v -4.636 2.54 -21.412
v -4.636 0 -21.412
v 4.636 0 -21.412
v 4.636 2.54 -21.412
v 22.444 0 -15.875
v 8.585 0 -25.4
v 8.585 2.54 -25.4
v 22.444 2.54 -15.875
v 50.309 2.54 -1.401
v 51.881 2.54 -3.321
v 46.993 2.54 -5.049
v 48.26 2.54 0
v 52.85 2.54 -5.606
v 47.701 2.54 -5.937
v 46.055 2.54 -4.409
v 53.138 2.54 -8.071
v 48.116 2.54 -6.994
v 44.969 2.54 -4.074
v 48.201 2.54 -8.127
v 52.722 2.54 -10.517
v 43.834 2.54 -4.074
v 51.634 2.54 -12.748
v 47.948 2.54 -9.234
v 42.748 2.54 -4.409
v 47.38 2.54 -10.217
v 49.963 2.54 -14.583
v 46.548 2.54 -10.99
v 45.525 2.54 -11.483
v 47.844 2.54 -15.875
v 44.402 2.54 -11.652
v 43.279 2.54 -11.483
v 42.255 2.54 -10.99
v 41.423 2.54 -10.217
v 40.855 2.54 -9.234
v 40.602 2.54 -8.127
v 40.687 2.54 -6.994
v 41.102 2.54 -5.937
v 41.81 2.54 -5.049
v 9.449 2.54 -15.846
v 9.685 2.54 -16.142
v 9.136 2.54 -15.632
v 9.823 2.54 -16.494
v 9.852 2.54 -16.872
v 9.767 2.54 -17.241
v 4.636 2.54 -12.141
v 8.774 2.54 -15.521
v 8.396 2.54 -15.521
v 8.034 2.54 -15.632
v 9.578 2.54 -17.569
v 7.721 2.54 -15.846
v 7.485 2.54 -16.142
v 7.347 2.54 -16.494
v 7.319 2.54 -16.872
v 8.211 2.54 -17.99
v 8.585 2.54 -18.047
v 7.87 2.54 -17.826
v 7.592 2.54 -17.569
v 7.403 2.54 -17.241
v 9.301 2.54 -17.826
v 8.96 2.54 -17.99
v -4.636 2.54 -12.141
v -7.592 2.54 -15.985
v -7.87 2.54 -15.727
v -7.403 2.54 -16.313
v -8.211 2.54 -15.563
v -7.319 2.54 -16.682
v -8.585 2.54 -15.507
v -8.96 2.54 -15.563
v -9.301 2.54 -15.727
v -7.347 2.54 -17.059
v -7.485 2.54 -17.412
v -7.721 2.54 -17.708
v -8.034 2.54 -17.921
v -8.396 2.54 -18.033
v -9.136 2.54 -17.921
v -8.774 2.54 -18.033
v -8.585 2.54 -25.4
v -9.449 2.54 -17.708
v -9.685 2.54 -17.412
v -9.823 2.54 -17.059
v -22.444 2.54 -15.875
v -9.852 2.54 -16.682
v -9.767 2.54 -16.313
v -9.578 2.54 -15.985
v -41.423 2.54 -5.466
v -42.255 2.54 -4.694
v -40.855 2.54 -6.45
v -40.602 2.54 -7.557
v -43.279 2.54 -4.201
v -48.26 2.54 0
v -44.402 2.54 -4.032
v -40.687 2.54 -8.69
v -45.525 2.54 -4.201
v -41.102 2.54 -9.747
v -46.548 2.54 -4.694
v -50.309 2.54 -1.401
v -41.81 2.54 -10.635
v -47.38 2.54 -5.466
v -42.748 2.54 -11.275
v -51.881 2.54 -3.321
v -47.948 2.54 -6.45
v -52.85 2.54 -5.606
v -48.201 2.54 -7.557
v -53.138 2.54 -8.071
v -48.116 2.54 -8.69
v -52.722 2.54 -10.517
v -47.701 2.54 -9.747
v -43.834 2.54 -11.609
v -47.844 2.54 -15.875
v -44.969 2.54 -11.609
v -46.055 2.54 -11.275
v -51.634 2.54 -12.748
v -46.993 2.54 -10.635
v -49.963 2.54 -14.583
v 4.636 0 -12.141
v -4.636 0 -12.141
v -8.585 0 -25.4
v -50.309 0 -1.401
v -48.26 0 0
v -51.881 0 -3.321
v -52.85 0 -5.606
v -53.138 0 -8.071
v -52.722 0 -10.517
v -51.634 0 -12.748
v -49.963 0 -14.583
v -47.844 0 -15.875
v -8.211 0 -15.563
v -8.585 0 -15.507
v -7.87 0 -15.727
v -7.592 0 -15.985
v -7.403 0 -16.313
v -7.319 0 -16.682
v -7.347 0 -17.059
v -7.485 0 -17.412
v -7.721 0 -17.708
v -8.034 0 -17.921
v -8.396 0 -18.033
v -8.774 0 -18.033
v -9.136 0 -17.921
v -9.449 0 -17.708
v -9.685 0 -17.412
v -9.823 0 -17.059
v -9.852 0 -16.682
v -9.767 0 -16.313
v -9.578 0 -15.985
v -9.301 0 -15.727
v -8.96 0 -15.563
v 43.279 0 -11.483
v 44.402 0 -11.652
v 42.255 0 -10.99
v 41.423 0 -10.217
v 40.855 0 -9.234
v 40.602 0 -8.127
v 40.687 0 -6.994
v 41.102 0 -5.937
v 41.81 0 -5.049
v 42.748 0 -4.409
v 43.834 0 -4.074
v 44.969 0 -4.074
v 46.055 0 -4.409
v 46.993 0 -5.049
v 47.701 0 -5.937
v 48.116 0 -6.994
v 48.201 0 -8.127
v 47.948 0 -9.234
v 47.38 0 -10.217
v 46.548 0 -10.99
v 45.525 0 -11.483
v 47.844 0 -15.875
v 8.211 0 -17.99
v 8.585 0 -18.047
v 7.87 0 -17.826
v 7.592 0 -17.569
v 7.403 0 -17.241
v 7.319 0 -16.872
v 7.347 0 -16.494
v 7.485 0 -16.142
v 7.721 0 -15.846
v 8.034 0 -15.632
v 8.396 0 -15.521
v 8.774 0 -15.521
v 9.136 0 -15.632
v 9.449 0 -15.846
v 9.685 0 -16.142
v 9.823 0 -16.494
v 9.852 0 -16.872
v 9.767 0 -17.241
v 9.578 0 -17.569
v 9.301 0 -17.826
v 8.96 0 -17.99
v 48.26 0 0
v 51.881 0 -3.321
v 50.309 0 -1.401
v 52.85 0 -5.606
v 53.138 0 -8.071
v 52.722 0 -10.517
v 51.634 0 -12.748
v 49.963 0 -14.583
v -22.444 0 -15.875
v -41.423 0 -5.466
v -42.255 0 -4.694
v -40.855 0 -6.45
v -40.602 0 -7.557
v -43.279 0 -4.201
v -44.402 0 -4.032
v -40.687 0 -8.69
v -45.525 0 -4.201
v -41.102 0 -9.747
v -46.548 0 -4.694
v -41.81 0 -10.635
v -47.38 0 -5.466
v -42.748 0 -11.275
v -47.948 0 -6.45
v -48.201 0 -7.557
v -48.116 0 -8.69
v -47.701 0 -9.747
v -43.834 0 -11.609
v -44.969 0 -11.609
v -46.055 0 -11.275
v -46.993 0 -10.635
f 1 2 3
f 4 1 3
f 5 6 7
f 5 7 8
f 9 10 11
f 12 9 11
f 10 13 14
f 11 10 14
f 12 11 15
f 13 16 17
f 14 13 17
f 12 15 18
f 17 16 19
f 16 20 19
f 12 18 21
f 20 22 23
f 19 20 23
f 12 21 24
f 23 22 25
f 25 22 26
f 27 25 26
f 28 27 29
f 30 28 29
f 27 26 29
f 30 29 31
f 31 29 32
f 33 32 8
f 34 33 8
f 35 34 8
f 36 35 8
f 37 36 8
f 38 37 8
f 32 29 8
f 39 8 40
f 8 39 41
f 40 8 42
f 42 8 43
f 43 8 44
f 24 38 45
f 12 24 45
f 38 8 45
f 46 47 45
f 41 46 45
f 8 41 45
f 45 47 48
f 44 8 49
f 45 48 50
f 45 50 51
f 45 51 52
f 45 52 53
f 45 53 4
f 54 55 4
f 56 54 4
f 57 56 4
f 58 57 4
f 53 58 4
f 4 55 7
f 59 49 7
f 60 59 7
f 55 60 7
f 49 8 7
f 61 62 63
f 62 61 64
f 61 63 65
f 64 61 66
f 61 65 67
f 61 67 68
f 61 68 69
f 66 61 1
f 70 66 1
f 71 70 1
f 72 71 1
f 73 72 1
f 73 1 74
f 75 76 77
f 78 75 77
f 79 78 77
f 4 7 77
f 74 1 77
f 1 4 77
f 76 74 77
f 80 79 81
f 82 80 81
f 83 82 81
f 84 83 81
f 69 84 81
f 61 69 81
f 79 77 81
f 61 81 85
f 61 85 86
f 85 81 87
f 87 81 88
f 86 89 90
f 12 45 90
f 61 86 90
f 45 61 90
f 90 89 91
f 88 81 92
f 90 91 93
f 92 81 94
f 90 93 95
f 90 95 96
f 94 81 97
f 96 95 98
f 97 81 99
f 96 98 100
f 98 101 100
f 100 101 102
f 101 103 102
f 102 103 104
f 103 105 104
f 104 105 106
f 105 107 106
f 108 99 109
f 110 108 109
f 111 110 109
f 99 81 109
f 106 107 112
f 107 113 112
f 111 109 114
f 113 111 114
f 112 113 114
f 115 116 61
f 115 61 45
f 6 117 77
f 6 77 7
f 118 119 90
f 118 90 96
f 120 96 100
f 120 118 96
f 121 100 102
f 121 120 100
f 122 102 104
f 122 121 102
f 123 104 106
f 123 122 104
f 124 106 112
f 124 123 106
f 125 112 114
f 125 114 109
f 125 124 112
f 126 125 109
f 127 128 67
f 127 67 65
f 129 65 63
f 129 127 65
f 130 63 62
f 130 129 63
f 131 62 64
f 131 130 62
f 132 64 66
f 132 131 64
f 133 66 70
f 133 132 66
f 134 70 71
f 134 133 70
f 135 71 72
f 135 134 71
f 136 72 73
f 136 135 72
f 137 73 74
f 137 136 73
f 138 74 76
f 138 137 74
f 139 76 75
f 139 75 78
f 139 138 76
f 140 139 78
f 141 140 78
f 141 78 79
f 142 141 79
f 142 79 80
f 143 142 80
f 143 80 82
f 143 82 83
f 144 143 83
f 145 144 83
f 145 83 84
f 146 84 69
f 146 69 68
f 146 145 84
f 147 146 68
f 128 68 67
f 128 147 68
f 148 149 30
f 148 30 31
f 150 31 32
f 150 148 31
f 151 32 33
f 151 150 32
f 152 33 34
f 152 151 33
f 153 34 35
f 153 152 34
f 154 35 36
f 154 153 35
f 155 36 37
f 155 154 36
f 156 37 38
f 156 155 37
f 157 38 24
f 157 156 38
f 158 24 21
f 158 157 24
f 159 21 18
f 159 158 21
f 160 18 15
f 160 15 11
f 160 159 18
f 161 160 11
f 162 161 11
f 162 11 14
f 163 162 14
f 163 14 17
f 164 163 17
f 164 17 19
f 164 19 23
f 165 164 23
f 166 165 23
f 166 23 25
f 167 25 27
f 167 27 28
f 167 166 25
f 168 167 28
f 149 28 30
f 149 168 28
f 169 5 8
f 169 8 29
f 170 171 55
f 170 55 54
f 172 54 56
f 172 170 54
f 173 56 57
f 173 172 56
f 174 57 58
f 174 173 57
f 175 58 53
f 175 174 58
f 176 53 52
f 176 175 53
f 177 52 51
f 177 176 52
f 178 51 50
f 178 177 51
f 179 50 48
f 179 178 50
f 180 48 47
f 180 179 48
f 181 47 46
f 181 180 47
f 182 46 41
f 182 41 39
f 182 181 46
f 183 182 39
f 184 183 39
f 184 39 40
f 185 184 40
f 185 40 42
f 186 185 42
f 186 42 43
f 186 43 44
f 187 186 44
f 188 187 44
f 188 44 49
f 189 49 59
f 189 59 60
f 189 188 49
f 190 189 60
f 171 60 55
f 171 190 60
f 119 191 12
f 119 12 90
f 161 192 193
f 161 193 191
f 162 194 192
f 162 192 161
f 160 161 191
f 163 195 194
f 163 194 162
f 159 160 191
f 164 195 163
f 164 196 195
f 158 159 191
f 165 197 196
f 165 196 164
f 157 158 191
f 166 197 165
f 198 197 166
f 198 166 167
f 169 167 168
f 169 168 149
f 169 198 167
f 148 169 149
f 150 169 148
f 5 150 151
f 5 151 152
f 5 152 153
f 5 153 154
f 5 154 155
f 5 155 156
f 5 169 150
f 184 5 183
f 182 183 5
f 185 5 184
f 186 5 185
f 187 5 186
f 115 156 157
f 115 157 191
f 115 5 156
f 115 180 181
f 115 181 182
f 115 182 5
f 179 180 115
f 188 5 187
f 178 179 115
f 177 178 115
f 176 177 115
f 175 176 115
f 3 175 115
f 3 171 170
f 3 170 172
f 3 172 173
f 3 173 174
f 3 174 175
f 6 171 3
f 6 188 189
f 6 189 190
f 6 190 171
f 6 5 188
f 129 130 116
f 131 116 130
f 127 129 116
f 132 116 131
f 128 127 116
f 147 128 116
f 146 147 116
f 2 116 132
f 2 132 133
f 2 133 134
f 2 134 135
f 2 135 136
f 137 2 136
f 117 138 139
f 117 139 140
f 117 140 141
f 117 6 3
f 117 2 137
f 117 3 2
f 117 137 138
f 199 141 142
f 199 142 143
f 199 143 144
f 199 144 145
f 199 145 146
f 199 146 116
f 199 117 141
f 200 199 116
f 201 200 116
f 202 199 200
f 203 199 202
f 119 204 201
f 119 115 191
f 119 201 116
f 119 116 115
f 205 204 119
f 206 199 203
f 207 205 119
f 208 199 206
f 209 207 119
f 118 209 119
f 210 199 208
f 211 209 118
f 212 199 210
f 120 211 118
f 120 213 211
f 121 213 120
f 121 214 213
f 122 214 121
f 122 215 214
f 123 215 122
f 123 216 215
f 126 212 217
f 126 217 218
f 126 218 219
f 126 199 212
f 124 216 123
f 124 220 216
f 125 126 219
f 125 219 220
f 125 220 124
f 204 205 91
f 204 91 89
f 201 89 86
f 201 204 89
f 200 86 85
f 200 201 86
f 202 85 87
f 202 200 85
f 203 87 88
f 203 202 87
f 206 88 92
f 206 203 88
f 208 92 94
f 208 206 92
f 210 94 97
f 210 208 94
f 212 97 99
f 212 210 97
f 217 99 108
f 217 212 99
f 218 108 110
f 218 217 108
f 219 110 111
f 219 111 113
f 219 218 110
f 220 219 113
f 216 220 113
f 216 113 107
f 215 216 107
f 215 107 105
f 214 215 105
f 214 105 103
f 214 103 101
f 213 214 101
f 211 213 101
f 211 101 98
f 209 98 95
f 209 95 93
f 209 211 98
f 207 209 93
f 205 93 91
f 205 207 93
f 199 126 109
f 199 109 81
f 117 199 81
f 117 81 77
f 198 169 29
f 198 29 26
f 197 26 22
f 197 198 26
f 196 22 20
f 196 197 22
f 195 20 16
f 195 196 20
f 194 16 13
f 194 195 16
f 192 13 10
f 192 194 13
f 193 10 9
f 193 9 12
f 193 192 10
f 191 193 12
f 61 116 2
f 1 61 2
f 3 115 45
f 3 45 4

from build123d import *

# Parameters (mm, degrees)
SKETCH1_R           = 1.27
SKETCH1_R_2         = 3.81
SKETCH1_W           = 9.271
SKETCH1_H           = 9.271
BOSS_EXTRUDE1_DEPTH = 2.54


with BuildPart() as part:
    # Sketch1 → Boss-Extrude1 (new body)
    with BuildSketch(Plane(origin=(0, 0, 0), x_dir=(1, 0, 0), z_dir=(0, 1, 0))):
        with BuildLine():
            Line((48.26, 0), (-48.26, 0))
            ThreePointArc((-48.26, 0), (-53.138298297, 8.070705976), (-47.844237094, 15.875))
            Line((-47.844237094, 15.875), (-22.444237094, 15.875))
            Line((-22.444237094, 15.875), (-8.5852, 25.4))
            Line((-8.5852, 25.4), (8.5852, 25.4))
            Line((8.5852, 25.4), (22.444237094, 15.875))
            Line((22.444237094, 15.875), (47.844237094, 15.875))
            ThreePointArc((47.844237094, 15.875), (53.138298297, 8.070705976), (48.26, 0))
        make_face()
        with Locations(Location((-8.5852, 16.7767, 0), (0, 0, 270))):
            Circle(SKETCH1_R, mode=Mode.SUBTRACT)
        with Locations(Location((8.5852, 16.7767, 0), (0, 0, 90))):
            Circle(SKETCH1_R, mode=Mode.SUBTRACT)
        with Locations(Location((-44.401571021, 7.841892929, 0), (0, 0, 270))):
            Circle(SKETCH1_R_2, mode=Mode.SUBTRACT)
        with Locations(Location((44.401571021, 7.841892929, 0), (0, 0, 90))):
            Circle(SKETCH1_R_2, mode=Mode.SUBTRACT)
        with Locations((0, 16.7767)):
            Rectangle(SKETCH1_W, SKETCH1_H, mode=Mode.SUBTRACT)
    extrude(amount=BOSS_EXTRUDE1_DEPTH)


solid = part.part
